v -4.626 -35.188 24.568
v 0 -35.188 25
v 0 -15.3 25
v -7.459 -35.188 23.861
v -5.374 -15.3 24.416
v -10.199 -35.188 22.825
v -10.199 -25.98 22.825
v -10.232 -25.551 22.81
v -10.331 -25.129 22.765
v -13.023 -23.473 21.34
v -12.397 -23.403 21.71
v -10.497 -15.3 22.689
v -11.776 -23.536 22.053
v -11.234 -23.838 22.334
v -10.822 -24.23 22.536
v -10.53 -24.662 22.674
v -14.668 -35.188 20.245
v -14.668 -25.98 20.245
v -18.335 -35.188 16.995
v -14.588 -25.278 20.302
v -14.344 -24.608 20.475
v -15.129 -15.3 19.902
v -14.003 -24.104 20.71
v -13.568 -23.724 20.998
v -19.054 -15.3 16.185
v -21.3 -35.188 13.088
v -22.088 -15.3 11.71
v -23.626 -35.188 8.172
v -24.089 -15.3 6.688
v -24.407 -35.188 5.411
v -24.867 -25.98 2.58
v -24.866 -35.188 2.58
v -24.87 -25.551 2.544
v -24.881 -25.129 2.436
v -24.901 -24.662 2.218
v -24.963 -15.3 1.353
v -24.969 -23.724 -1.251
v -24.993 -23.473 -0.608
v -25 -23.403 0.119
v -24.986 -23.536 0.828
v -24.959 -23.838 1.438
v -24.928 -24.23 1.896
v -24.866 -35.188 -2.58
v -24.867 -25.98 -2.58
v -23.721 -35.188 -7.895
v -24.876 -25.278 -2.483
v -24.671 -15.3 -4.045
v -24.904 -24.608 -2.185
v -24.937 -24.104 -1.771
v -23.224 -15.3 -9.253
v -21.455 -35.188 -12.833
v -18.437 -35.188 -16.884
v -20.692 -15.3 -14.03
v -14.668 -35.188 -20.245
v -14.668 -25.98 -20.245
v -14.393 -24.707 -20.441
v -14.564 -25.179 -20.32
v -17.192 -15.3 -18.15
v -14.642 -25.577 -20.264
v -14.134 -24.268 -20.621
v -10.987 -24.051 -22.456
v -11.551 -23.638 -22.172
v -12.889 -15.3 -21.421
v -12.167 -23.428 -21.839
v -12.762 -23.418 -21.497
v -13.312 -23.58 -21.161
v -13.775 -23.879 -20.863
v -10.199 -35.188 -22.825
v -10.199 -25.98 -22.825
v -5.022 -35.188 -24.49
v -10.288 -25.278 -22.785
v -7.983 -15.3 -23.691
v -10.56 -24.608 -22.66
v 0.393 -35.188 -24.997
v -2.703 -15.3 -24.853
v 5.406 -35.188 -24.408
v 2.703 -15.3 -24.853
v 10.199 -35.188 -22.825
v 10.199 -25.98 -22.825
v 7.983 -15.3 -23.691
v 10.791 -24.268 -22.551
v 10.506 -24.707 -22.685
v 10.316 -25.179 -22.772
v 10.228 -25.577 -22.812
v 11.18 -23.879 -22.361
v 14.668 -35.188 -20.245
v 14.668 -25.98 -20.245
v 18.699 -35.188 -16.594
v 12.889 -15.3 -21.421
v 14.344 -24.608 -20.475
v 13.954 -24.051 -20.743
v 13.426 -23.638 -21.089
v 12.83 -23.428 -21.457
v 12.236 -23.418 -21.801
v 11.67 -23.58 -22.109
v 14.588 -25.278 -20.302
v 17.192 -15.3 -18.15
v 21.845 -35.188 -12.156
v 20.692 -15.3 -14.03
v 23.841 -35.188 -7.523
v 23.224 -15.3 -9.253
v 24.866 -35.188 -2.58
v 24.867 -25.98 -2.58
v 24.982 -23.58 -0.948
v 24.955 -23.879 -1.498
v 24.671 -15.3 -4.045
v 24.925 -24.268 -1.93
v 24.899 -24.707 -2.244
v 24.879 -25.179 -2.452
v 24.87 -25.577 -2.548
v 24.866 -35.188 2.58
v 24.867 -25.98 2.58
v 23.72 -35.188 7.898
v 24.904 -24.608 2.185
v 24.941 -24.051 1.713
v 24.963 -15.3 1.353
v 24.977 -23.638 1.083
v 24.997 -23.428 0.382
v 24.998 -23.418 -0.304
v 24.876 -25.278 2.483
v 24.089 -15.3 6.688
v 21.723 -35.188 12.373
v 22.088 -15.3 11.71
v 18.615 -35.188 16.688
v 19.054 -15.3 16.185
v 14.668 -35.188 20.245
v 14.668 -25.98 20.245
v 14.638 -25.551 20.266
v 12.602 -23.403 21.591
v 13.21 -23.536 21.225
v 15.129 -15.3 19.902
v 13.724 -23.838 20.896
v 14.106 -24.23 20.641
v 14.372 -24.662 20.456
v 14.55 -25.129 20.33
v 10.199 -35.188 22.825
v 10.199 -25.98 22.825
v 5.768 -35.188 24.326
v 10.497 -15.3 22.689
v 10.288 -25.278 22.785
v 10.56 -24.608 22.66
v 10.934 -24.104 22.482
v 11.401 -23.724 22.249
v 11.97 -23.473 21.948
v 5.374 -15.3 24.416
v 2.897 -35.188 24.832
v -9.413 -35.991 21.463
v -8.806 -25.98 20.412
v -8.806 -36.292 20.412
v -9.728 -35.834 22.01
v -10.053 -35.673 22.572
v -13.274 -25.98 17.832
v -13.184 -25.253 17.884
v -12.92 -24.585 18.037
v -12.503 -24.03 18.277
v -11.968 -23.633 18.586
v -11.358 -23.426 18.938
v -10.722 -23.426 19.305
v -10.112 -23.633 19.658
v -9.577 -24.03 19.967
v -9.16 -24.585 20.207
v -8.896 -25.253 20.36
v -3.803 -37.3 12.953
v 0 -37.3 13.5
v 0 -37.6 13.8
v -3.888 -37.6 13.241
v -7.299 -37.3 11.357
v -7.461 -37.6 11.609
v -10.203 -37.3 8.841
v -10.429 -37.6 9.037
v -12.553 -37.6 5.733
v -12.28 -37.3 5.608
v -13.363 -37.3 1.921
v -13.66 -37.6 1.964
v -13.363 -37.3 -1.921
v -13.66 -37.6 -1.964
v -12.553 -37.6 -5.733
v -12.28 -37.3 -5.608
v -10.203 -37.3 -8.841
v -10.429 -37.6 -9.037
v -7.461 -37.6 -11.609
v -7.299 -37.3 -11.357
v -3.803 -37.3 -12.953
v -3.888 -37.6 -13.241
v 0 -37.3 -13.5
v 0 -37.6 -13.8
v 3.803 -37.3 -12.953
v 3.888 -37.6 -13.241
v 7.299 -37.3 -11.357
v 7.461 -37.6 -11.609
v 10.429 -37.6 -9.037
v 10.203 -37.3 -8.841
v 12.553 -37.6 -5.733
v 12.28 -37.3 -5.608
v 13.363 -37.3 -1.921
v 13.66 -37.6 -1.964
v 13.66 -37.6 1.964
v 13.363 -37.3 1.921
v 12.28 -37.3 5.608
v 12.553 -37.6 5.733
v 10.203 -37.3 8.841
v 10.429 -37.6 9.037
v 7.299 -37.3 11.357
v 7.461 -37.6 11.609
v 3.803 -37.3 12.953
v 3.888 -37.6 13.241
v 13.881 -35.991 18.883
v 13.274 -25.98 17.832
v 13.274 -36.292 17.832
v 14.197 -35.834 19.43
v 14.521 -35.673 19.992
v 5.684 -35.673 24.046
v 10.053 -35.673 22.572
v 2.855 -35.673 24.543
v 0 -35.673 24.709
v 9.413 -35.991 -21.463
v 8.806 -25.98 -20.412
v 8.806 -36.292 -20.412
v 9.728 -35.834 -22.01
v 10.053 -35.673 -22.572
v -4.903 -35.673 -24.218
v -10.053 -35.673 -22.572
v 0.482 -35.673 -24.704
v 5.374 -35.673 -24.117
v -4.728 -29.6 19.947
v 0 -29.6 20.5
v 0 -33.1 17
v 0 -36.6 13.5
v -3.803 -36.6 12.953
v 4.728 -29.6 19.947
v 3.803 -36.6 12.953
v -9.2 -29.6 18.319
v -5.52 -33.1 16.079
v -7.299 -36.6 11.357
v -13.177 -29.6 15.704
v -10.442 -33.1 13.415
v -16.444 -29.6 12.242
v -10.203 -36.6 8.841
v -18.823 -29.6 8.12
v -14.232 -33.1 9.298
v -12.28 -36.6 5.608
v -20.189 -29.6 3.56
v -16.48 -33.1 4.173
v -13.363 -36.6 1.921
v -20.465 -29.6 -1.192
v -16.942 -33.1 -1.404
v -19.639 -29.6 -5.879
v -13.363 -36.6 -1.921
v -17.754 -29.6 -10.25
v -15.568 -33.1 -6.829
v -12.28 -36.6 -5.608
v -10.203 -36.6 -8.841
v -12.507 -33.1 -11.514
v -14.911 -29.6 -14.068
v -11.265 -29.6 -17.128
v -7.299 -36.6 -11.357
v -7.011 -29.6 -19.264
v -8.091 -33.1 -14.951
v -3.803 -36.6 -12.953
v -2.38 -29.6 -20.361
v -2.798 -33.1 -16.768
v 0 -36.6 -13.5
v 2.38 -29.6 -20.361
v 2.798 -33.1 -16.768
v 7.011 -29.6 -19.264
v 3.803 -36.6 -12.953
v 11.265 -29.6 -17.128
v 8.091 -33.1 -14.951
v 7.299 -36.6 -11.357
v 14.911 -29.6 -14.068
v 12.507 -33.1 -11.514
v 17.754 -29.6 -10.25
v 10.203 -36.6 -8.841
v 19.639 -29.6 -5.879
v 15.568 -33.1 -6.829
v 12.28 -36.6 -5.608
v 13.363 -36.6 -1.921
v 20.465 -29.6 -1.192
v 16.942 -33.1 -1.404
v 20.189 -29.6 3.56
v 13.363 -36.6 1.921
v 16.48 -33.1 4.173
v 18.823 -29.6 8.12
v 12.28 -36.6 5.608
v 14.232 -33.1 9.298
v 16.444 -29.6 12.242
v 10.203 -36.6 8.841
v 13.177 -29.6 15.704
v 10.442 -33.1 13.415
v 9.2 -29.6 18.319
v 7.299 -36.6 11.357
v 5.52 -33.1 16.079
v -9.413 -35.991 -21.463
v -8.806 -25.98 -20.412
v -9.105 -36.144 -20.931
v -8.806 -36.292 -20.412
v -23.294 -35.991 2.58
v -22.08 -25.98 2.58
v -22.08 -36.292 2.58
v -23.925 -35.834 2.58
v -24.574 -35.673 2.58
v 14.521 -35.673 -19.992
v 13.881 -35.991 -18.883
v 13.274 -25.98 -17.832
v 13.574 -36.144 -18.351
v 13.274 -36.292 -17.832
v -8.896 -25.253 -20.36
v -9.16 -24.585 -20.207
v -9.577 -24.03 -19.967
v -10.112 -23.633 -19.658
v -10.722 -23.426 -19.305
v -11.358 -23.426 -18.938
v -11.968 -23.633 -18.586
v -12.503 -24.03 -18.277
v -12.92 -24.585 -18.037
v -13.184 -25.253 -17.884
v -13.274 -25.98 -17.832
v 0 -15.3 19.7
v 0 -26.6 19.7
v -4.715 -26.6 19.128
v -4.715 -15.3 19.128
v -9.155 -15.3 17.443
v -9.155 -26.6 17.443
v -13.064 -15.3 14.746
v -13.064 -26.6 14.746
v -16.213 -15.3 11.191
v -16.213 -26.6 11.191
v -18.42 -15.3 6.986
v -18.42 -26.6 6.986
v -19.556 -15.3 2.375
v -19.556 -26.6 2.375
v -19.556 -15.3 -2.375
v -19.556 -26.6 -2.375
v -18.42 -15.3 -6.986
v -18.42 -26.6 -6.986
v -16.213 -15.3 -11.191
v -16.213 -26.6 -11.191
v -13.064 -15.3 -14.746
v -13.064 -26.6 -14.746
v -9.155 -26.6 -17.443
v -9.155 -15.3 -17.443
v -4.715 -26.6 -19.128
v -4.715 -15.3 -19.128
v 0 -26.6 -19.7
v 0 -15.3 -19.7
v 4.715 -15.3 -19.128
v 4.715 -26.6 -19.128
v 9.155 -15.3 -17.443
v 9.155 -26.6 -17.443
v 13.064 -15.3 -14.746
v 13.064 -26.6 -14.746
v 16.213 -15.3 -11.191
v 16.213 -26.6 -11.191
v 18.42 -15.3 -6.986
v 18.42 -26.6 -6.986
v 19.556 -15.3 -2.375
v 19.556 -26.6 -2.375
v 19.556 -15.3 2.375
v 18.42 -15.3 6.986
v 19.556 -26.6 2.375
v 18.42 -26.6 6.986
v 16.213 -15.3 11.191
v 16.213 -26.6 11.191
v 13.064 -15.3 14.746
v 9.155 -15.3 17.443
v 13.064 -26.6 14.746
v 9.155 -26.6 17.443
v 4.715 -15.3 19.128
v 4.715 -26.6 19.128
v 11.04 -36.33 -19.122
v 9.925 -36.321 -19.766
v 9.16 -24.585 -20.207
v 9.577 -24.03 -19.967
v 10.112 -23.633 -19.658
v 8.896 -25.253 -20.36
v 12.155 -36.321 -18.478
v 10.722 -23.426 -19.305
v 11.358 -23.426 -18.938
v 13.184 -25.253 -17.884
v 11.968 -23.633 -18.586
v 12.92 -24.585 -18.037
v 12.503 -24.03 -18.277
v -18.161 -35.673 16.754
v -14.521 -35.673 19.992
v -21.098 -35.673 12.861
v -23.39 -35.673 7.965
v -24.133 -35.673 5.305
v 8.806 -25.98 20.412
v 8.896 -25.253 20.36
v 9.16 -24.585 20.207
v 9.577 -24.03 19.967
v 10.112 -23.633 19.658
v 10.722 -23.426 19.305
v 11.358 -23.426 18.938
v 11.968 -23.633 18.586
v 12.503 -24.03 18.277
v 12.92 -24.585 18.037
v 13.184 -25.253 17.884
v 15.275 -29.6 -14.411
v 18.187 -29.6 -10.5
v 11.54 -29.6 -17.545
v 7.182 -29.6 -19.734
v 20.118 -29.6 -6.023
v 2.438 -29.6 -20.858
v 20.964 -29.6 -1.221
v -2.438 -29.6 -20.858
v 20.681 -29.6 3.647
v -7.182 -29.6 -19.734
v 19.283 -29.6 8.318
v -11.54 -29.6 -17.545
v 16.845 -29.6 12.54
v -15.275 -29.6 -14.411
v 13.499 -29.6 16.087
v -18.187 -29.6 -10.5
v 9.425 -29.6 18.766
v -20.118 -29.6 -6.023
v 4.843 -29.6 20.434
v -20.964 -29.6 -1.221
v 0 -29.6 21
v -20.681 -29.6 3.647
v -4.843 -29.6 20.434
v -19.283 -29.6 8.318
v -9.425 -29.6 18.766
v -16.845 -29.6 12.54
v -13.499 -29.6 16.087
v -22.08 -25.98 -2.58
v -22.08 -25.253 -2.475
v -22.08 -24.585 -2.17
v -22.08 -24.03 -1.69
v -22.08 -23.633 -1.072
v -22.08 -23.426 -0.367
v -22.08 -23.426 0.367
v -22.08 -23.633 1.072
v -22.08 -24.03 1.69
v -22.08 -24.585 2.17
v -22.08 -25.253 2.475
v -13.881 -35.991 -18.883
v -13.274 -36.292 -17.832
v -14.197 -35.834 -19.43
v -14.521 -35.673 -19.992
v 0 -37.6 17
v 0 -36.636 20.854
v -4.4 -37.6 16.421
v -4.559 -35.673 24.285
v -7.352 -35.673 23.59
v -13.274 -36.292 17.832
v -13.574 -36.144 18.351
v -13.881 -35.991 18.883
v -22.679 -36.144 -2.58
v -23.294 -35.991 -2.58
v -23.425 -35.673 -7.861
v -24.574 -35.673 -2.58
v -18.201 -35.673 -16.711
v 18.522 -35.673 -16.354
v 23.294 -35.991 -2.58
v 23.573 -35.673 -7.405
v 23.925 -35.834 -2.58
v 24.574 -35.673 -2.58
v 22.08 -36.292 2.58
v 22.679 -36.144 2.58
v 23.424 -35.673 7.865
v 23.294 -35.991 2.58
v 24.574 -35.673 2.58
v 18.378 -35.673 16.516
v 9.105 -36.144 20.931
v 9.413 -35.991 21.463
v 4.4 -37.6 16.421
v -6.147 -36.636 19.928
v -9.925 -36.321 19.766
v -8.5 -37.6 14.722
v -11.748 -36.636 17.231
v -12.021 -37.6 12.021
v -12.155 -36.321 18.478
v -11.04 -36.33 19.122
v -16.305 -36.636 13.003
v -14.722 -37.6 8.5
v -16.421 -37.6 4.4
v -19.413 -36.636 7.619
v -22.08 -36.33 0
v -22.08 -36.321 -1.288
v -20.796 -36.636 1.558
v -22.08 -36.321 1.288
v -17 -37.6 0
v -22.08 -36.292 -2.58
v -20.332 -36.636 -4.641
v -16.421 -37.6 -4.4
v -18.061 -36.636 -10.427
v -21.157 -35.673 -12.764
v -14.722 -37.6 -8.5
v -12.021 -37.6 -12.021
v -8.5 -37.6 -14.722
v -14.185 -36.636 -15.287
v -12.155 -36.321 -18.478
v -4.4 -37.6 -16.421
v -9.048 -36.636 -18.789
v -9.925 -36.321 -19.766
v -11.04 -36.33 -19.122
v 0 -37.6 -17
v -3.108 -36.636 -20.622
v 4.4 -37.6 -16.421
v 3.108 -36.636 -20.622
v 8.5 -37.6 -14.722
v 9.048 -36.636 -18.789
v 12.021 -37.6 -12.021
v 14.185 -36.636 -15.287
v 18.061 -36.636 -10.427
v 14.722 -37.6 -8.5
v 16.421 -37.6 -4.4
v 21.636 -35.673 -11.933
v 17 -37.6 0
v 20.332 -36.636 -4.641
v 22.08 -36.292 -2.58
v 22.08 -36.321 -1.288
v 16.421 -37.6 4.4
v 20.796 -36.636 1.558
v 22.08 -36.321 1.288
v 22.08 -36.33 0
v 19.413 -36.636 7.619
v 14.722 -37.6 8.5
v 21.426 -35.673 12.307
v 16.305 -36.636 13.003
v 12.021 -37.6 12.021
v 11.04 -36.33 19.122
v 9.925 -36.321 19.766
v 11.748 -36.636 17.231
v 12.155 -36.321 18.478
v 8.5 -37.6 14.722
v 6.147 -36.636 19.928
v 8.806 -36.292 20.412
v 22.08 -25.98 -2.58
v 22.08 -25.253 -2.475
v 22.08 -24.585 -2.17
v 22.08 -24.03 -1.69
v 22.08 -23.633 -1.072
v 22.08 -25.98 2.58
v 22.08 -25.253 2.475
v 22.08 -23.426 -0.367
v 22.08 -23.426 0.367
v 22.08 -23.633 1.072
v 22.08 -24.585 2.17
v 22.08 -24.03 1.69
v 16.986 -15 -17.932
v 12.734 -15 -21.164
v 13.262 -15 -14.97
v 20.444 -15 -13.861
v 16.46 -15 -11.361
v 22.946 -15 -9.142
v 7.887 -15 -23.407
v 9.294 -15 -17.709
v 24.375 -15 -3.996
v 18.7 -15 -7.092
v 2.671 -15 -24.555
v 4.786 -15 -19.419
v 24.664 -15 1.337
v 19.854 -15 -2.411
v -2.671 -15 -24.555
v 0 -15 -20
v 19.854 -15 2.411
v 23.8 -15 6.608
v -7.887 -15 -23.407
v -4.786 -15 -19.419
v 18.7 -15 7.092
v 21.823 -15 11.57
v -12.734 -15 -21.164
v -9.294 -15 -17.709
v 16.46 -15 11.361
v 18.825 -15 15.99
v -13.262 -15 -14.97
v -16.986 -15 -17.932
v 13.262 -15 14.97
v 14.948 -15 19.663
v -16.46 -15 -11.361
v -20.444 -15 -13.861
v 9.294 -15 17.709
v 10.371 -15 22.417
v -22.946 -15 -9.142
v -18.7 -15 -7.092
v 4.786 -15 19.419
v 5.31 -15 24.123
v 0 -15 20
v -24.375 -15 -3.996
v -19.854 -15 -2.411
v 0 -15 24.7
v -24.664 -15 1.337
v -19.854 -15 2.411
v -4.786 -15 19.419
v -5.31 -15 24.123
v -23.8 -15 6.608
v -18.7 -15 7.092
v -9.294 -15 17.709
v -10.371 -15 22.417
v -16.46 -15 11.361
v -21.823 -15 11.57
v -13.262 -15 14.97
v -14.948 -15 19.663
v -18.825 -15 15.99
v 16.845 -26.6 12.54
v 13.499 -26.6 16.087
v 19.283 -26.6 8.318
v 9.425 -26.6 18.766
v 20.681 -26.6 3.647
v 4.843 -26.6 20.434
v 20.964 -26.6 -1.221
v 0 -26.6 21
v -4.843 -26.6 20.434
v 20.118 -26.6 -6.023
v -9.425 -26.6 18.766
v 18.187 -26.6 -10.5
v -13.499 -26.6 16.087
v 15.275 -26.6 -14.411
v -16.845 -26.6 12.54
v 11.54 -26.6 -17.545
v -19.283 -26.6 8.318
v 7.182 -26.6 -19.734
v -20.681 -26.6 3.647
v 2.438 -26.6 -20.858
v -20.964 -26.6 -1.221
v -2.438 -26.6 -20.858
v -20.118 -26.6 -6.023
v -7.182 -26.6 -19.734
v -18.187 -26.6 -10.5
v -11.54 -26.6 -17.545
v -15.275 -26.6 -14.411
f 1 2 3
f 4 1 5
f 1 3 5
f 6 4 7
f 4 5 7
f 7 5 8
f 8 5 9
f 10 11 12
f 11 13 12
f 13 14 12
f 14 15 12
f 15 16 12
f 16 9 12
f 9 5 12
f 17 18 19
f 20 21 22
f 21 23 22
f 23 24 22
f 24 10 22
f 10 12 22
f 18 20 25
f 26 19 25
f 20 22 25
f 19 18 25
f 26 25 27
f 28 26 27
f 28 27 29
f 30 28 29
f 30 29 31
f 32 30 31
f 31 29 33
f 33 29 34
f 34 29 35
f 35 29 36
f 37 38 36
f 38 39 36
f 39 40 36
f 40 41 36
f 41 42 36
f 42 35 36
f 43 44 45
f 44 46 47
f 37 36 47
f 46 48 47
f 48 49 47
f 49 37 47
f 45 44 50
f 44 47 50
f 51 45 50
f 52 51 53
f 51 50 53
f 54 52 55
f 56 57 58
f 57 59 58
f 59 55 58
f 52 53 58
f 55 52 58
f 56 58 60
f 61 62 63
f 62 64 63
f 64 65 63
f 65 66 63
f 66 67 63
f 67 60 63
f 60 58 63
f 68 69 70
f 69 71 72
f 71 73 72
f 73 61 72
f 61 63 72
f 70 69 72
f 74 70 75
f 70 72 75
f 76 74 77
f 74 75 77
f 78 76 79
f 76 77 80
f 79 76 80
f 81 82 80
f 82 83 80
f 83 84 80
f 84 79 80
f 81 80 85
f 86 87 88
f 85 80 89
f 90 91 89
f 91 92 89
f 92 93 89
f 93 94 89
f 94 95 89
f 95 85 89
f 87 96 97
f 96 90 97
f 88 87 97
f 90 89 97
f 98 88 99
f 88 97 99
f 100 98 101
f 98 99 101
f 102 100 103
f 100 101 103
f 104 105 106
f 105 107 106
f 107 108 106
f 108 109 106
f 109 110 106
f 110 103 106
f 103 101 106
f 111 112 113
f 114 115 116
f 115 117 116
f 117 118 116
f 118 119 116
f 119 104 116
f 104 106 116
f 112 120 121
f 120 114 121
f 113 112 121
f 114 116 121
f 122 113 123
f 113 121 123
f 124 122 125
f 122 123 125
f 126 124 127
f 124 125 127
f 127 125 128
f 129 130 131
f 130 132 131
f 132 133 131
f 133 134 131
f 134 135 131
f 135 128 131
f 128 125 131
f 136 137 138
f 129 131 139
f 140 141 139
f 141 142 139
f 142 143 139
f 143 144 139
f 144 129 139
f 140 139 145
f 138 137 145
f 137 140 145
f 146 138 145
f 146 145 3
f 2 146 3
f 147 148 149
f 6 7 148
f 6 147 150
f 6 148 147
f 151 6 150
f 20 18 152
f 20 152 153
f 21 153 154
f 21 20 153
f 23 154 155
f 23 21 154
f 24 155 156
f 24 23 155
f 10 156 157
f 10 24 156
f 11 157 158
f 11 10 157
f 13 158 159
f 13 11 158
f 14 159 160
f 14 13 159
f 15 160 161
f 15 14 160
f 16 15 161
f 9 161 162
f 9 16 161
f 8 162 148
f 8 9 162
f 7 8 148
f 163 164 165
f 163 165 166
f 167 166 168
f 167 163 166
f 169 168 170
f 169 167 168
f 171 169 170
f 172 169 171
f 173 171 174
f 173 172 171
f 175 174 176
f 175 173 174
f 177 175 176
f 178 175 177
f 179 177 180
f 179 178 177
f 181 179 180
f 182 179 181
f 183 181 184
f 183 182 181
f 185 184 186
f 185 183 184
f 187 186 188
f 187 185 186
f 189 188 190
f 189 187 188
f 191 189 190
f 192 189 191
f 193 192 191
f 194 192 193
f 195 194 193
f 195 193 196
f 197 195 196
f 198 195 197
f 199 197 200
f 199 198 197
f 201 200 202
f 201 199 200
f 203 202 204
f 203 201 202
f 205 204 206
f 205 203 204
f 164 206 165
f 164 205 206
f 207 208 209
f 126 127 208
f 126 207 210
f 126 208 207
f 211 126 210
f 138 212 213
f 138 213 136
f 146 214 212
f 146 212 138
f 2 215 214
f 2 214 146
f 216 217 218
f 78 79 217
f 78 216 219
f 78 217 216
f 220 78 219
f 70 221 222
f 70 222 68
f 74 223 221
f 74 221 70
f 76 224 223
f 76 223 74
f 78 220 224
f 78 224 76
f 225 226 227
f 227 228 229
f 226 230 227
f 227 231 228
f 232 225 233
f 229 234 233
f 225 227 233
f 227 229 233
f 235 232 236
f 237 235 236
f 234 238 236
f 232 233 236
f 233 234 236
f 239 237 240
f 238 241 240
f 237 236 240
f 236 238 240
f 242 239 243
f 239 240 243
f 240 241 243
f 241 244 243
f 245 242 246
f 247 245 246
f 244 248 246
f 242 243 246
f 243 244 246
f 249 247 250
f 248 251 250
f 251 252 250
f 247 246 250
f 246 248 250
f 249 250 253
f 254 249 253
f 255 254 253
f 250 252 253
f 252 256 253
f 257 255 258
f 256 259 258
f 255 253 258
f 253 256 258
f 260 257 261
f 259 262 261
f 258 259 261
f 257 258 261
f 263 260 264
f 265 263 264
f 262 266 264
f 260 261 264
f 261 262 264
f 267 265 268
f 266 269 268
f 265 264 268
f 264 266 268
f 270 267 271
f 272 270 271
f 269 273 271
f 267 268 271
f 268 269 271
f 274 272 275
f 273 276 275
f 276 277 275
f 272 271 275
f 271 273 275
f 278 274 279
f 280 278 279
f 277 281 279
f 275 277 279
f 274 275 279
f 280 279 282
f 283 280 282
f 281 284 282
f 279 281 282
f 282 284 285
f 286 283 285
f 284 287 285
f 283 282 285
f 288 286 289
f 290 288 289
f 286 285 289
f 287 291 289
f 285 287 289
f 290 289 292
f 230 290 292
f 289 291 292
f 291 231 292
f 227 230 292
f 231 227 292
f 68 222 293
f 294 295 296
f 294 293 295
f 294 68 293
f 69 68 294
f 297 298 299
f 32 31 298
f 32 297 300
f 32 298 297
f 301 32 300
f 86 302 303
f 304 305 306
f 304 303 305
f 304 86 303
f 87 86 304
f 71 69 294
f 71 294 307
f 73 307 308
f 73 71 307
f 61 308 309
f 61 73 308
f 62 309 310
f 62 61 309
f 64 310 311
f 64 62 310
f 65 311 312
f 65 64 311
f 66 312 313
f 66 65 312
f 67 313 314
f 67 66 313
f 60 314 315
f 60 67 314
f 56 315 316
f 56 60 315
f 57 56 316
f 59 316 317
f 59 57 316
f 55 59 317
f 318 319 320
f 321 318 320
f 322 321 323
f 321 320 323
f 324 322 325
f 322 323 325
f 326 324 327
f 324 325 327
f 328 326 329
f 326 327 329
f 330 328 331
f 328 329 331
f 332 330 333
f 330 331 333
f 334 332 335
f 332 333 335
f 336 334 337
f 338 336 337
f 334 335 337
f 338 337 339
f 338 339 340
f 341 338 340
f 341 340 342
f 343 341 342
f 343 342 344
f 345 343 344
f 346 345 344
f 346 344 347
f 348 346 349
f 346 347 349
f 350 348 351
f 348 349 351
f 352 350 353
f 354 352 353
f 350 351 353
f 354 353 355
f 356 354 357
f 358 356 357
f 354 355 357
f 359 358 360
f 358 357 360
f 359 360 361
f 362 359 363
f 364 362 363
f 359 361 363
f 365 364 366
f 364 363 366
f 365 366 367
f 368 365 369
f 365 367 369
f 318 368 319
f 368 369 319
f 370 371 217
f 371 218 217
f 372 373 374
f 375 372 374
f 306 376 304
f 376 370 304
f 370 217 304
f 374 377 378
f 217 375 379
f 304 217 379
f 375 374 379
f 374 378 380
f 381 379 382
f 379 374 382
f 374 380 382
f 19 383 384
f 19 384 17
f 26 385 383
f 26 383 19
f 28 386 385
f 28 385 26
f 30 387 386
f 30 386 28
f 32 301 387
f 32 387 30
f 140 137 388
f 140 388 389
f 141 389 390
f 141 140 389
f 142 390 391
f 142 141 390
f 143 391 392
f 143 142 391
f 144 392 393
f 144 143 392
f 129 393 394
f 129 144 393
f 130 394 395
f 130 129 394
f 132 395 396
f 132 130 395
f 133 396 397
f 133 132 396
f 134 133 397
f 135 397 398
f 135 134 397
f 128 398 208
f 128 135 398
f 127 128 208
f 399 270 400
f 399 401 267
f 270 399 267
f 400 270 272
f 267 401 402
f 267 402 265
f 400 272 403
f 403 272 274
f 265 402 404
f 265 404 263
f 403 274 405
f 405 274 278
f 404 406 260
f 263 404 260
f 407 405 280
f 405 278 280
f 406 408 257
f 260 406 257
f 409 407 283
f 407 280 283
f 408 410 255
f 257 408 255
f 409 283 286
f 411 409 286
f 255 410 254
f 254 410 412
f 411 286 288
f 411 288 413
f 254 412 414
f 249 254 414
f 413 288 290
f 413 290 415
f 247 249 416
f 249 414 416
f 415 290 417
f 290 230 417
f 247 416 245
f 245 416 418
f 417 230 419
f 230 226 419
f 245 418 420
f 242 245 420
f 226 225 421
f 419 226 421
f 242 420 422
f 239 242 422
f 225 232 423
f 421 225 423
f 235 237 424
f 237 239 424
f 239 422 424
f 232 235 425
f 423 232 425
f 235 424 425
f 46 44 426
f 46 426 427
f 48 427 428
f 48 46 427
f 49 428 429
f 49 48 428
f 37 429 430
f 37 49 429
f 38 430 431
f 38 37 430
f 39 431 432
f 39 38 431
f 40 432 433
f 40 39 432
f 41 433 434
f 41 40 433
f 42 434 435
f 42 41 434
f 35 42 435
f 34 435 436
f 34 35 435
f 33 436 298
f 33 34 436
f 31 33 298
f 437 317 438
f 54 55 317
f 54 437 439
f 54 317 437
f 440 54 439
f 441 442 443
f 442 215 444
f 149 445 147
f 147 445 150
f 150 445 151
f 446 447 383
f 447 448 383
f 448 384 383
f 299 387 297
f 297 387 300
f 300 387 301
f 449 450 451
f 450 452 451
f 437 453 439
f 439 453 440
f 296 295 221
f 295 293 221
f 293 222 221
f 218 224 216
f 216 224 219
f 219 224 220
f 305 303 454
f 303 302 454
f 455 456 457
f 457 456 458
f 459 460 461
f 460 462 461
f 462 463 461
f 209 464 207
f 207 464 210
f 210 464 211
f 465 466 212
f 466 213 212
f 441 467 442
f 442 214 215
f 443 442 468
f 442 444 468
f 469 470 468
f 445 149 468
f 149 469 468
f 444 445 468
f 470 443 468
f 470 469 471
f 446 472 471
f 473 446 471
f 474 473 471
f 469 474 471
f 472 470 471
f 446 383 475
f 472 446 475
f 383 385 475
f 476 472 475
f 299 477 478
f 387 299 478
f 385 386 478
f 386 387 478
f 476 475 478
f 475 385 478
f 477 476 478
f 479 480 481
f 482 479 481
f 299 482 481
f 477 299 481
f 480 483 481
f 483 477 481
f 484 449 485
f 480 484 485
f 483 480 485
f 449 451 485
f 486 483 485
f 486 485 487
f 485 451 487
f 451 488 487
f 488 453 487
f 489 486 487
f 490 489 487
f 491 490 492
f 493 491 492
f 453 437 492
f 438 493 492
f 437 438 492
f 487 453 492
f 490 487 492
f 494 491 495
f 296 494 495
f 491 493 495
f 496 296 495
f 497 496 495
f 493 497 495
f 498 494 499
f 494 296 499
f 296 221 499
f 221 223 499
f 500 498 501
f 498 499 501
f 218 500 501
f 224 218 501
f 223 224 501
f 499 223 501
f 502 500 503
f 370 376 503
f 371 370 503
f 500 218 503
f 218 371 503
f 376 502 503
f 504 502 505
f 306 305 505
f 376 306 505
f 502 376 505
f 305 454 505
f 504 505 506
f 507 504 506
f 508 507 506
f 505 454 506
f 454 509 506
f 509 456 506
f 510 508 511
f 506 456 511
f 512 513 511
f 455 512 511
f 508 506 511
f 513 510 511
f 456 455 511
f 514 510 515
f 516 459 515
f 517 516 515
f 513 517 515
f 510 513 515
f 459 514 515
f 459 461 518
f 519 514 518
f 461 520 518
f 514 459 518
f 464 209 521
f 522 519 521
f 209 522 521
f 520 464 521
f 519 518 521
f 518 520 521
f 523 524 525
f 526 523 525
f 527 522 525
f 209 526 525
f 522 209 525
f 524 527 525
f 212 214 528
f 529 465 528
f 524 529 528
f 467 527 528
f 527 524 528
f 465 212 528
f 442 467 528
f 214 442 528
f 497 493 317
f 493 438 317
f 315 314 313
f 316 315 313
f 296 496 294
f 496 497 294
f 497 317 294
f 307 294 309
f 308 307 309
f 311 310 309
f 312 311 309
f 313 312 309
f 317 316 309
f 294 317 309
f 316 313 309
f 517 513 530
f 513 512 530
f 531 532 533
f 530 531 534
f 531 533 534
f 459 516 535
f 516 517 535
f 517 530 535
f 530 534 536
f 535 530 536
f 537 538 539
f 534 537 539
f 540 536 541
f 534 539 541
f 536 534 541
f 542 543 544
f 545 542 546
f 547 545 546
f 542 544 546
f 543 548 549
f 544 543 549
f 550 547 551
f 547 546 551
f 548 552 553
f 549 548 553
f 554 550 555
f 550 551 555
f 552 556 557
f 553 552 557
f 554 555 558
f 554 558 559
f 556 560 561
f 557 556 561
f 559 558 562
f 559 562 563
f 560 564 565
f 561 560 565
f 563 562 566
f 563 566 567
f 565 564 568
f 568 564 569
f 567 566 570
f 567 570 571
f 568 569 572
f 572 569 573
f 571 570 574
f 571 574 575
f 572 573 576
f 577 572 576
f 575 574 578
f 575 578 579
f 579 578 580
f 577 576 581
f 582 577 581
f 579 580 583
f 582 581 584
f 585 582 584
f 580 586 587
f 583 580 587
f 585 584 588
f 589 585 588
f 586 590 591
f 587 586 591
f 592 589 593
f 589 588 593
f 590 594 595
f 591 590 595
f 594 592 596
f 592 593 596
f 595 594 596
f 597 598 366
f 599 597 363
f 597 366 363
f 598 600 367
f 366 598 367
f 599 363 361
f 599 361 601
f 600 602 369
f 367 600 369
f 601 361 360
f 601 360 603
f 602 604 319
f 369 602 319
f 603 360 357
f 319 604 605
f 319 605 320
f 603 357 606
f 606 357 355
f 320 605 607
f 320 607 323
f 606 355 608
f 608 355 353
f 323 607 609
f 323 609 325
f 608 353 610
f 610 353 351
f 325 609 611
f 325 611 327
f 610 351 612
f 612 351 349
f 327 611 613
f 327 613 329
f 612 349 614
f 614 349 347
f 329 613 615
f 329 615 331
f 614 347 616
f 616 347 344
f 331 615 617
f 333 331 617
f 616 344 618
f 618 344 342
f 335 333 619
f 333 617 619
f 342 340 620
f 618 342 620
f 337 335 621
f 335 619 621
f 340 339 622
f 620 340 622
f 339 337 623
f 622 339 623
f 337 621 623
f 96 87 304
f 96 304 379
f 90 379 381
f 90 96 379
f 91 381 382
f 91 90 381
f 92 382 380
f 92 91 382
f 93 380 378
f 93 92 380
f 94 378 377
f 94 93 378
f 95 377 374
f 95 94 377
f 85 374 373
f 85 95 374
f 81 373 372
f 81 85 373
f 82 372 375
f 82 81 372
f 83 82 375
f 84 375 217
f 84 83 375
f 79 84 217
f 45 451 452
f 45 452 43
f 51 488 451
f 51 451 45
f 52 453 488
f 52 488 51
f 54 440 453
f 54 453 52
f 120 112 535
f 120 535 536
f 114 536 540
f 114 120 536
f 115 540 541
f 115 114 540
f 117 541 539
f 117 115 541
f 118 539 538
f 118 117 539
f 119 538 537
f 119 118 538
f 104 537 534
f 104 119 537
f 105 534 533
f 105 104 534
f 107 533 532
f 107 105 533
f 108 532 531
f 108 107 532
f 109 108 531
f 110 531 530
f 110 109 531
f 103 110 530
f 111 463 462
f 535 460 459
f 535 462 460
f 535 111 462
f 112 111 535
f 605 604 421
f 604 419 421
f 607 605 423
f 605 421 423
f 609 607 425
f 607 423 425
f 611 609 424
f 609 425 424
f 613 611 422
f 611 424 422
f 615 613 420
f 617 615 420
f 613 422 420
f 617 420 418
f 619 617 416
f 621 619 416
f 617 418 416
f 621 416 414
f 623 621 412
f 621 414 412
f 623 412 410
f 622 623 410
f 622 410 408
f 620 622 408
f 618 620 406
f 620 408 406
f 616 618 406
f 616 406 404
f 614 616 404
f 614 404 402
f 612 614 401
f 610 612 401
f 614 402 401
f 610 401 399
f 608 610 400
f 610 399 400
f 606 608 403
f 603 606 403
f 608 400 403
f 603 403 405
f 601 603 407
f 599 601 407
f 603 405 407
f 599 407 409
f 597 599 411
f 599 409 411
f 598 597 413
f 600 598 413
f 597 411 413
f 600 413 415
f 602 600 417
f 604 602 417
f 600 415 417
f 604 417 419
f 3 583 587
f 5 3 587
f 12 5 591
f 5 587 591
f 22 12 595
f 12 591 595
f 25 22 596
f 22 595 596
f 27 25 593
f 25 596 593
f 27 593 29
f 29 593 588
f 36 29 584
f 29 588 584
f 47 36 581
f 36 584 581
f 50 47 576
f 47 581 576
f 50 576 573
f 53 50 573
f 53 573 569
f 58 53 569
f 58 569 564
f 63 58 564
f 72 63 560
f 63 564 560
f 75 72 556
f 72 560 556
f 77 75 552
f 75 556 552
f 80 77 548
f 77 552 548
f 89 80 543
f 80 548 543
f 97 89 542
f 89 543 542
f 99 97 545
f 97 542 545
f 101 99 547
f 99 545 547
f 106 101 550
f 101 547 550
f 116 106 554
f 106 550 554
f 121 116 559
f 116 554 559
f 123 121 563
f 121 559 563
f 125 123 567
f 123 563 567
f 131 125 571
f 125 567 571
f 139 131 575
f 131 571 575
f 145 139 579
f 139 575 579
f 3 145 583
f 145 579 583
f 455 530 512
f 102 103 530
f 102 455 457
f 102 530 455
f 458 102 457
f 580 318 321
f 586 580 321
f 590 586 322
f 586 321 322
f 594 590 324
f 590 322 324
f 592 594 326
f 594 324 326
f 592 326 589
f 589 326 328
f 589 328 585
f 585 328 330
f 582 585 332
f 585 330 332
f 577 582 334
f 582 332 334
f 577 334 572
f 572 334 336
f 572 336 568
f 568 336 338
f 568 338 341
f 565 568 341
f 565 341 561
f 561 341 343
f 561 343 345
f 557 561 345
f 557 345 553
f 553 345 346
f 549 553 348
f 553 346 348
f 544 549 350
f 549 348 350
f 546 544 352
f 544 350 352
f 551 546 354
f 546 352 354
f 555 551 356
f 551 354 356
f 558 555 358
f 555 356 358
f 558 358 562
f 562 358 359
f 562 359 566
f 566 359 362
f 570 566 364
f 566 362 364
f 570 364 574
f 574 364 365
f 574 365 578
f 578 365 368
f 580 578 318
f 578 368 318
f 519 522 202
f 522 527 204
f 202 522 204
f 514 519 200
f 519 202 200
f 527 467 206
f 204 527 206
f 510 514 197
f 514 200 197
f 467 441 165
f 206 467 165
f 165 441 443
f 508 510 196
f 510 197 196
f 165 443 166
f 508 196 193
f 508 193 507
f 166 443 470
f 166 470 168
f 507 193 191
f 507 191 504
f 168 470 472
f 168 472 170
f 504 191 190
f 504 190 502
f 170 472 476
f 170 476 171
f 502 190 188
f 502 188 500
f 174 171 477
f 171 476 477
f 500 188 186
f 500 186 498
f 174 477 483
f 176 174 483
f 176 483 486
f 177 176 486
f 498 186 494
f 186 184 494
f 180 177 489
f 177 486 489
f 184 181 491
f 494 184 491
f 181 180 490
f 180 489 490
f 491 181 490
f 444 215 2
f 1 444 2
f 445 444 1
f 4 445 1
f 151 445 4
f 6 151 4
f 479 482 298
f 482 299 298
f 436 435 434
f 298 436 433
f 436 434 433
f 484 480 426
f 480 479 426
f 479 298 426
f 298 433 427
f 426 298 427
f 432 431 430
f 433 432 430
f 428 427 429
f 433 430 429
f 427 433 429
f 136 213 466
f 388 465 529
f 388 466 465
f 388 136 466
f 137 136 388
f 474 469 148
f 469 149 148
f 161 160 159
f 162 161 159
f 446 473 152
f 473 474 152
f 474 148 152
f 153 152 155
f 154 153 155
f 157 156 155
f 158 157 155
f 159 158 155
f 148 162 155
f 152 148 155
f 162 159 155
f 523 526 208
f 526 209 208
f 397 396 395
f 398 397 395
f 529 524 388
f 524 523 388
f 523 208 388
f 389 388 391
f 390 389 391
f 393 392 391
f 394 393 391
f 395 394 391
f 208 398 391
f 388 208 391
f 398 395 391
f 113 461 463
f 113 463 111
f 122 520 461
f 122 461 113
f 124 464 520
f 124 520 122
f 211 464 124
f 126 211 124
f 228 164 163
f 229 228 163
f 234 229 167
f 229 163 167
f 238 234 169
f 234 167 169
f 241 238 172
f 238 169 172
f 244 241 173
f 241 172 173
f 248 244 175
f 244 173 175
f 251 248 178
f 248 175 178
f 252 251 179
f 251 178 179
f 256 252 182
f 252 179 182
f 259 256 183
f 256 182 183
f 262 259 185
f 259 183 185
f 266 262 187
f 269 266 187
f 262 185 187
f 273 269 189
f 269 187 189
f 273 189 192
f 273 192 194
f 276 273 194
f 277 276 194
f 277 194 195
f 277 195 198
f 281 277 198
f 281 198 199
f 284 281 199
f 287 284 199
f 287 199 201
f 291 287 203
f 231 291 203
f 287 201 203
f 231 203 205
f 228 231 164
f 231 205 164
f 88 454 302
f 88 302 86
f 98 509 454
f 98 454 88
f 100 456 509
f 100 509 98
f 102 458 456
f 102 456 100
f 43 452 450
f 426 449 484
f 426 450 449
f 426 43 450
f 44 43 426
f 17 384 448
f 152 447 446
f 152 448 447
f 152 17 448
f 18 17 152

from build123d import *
from OCP.BRepFilletAPI import BRepFilletAPI_MakeChamfer

# Parameters (mm, degrees)
CHAMFER1_SIZE      = 8
CHAMFER1_SIZE2     = 2
CHAMFER2_SIZE      = 0.3
CHAMFER2_SIZE2     = 0.412310563
CUT_EXTRUDE1_DEPTH = 2.92
CIRPATTERN1_COUNT  = 6


with BuildPart() as part:
    # Sketch1 → Revolve1 (revolve)
    with BuildSketch(Plane.XY, mode=Mode.PRIVATE) as revolve1_sk:
        Polygon((19.7, -15), (19.7, -26.6), (21, -26.6), (21, -29.6), (20.5, -29.6), (13.5, -36.6), (13.5, -37.6), (25, -37.6), (25, -15), align=None)
    revolve(revolve1_sk.sketch.rotate(Axis((0, 0, 0), (0, -1, 0)), 90), axis=Axis((0, 0, 0), (0, -1, 0)))

    # Chamfer1
    chamfer1_edges = [part.edges().sort_by_distance(p)[0] for p in [
        (0, -37.6, -25),
    ]]
    chamfer1_side = [part.faces().sort_by_distance(p)[0] for p in [
        (0, -37.6, -14.207106781),
    ]]
    chamfer(chamfer1_edges, length=CHAMFER1_SIZE, length2=CHAMFER1_SIZE2, reference=chamfer1_side[0])

    # Chamfer2: one chamfer whose edges measure the first distance from different faces: ONE call of the kernel's chamfer builder (chamfer() names one face for all edges)
    chamfer2_edges_1 = [part.edges().sort_by_distance(p)[0] for p in [
        (0, -35.6, -25),
    ]]
    chamfer2_side_1 = [part.faces().sort_by_distance(p)[0] for p in [
        (0, -36.6, -21),
    ]]
    chamfer2_edges_2 = [part.edges().sort_by_distance(p)[0] for p in [
        (0, -37.6, -13.5),
        (0, -15, -25),
        (0, -15, -19.7),
    ]]
    chamfer2 = BRepFilletAPI_MakeChamfer(part.part.solid().wrapped)
    for e in chamfer2_edges_1:
        chamfer2.Add(CHAMFER2_SIZE, CHAMFER2_SIZE2, e.wrapped, chamfer2_side_1[0].wrapped)  # the first distance lies on this face
    for e in chamfer2_edges_2:
        chamfer2.Add(CHAMFER2_SIZE, e.wrapped)
    add(Compound.cast(chamfer2.Shape()), mode=Mode.REPLACE)

    # Sketch4 → Cut-Extrude1 (cut)
    with BuildSketch(Plane.ZY.offset(25)):
        with BuildLine():
            Line((-2.58, -37.6), (-2.58, -25.98))
            ThreePointArc((-2.58, -25.98), (0, -23.4), (2.58, -25.98))
            Line((2.58, -25.98), (2.58, -37.6))
            ThreePointArc((2.58, -37.6), (0, -40.18), (-2.58, -37.6))
        make_face()
    cut_extrude1 = extrude(amount=-CUT_EXTRUDE1_DEPTH, mode=Mode.SUBTRACT)

    # CirPattern1: Cut-Extrude1 ×6 about axis
    cirpattern1_axis = Axis((0, 0, 0), (0, 1, 0))
    for i in range(1, CIRPATTERN1_COUNT):
        add(cut_extrude1.rotate(cirpattern1_axis, i * 360 / CIRPATTERN1_COUNT), mode=Mode.SUBTRACT)


solid = part.part
